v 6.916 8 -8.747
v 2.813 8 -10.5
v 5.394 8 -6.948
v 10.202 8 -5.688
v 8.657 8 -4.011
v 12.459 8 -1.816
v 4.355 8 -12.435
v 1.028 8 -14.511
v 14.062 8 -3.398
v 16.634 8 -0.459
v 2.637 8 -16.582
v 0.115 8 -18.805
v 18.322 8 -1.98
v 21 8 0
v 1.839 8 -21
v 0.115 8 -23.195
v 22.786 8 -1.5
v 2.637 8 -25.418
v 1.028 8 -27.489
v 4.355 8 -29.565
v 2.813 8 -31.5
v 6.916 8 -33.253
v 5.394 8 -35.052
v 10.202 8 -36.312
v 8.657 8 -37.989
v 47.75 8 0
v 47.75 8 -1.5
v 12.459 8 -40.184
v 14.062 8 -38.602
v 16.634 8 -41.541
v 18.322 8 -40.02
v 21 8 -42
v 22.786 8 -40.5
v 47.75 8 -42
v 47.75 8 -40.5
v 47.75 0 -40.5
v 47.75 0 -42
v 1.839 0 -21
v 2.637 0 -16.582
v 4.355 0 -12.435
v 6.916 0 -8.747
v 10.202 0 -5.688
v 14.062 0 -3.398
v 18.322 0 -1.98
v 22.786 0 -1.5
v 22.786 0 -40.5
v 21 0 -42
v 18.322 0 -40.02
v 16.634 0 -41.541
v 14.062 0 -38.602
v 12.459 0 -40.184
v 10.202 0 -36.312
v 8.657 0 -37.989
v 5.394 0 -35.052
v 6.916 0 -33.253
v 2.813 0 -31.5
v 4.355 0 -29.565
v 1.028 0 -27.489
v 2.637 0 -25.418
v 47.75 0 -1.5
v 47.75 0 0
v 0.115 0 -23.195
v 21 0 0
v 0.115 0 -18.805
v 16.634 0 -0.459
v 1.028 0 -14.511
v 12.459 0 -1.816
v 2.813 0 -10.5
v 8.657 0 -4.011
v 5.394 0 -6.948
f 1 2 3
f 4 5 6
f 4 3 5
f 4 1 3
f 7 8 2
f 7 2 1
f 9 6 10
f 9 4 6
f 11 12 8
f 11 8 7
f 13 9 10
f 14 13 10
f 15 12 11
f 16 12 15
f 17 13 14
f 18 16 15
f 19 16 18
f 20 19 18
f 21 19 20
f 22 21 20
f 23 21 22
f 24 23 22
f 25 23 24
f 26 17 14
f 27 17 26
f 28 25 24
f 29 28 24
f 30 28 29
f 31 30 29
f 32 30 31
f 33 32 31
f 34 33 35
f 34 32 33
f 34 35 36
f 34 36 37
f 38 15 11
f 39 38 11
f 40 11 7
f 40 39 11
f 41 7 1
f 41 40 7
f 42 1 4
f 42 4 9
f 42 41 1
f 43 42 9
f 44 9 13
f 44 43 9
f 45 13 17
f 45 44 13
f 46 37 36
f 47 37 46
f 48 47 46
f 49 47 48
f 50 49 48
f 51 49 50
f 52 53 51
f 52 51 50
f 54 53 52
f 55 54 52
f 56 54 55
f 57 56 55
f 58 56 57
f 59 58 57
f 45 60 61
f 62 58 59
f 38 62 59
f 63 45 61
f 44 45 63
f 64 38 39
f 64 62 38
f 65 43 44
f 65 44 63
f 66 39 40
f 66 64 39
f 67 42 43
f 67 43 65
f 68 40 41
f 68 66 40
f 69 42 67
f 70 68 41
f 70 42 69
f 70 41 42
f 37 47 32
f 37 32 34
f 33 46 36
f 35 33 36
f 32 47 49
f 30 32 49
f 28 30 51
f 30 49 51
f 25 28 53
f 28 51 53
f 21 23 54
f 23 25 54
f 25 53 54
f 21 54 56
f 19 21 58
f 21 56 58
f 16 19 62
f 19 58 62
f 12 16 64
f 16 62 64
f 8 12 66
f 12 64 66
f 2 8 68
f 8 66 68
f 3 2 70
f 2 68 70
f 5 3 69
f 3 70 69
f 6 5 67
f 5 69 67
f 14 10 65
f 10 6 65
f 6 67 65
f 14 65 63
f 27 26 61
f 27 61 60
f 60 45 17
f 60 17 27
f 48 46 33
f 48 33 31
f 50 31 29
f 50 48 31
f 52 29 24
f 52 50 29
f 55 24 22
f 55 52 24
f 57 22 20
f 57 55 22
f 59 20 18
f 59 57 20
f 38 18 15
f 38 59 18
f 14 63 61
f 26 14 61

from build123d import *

# Parameters (mm, degrees)
CROQUIS3_W                 = 50
CROQUIS3_H                 = 42
SALIENTE_EXTRUIR7_DEPTH    = 8
CORTAR_EXTRUIR2_DEPTH      = 8
CORTAR_EXTRUIR2_DEPTH_BACK = 8
CROQUIS3_13_W              = 46.428571428
CROQUIS3_13_H              = 39
REDONDEO3_R                = 21
CROQUIS7_W                 = 3.39365255
CROQUIS7_H                 = 46.015277421
CORTAR_EXTRUIR3_DEPTH      = 8


with BuildPart() as part:
    # Croquis3 → Saliente-Extruir7 (new body)
    with BuildSketch(Plane(origin=(0, 0, 0), x_dir=(1, 0, 0), z_dir=(0, 1, 0))):
        with Locations((25, 21)):
            Rectangle(CROQUIS3_W, CROQUIS3_H)
    extrude(amount=SALIENTE_EXTRUIR7_DEPTH)

    # Croquis3<13> → Cortar-Extruir2 (cut, two sides: drawn at the far end of the back side and taken through both)
    with BuildSketch(Plane(origin=(0, 0, 0), x_dir=(1, 0, 0), z_dir=(0, 1, 0)).offset(-CORTAR_EXTRUIR2_DEPTH_BACK)):
        with Locations((25, 21)):
            Rectangle(CROQUIS3_13_W, CROQUIS3_13_H)
    extrude(amount=CORTAR_EXTRUIR2_DEPTH + CORTAR_EXTRUIR2_DEPTH_BACK, mode=Mode.SUBTRACT)

    # Redondeo3
    # the kernel refuses this fillet: 21 mm, written as the material it adds along each edge
    with BuildSketch(Plane(origin=(1.785714286, 0, -1.5), x_dir=(0, 0, -1), z_dir=(0, 1, 0)), Plane(origin=(1.785714286, 0, -40.5), x_dir=(1, 0, 0), z_dir=(0, 1, 0))) as redondeo3_piece_1:
        with BuildLine():
            CenterArc((REDONDEO3_R, -REDONDEO3_R), REDONDEO3_R, 90, 90)
            Line((0, -REDONDEO3_R), (0, 0))
            Line((0, 0), (REDONDEO3_R, 0))
        make_face()
    extrude(amount=8)
    # the kernel refuses this fillet: 21 mm, written as the material it takes off along each edge
    with BuildSketch(Plane(origin=(0, -52.5, 0), x_dir=(1, 0, 0), z_dir=(0, 1, 0)), Plane(origin=(0, -52.5, -42), x_dir=(0, 0, 1), z_dir=(0, 1, 0))) as redondeo3_2_piece_1:
        with BuildLine():
            CenterArc((REDONDEO3_R, REDONDEO3_R), REDONDEO3_R, 180, 90)
            Line((0, REDONDEO3_R), (0, 0))
            Line((0, 0), (REDONDEO3_R, 0))
        make_face()
    extrude(amount=113, mode=Mode.SUBTRACT)

    # Croquis7 → Cortar-Extruir3 (cut)
    with BuildSketch(Plane(origin=(0, 8, 0), x_dir=(1, 0, 0), z_dir=(0, 1, 0))):
        with Locations((49.446476979, 20.219134687)):
            Rectangle(CROQUIS7_W, CROQUIS7_H)
    extrude(amount=-CORTAR_EXTRUIR3_DEPTH, mode=Mode.SUBTRACT)


solid = part.part
